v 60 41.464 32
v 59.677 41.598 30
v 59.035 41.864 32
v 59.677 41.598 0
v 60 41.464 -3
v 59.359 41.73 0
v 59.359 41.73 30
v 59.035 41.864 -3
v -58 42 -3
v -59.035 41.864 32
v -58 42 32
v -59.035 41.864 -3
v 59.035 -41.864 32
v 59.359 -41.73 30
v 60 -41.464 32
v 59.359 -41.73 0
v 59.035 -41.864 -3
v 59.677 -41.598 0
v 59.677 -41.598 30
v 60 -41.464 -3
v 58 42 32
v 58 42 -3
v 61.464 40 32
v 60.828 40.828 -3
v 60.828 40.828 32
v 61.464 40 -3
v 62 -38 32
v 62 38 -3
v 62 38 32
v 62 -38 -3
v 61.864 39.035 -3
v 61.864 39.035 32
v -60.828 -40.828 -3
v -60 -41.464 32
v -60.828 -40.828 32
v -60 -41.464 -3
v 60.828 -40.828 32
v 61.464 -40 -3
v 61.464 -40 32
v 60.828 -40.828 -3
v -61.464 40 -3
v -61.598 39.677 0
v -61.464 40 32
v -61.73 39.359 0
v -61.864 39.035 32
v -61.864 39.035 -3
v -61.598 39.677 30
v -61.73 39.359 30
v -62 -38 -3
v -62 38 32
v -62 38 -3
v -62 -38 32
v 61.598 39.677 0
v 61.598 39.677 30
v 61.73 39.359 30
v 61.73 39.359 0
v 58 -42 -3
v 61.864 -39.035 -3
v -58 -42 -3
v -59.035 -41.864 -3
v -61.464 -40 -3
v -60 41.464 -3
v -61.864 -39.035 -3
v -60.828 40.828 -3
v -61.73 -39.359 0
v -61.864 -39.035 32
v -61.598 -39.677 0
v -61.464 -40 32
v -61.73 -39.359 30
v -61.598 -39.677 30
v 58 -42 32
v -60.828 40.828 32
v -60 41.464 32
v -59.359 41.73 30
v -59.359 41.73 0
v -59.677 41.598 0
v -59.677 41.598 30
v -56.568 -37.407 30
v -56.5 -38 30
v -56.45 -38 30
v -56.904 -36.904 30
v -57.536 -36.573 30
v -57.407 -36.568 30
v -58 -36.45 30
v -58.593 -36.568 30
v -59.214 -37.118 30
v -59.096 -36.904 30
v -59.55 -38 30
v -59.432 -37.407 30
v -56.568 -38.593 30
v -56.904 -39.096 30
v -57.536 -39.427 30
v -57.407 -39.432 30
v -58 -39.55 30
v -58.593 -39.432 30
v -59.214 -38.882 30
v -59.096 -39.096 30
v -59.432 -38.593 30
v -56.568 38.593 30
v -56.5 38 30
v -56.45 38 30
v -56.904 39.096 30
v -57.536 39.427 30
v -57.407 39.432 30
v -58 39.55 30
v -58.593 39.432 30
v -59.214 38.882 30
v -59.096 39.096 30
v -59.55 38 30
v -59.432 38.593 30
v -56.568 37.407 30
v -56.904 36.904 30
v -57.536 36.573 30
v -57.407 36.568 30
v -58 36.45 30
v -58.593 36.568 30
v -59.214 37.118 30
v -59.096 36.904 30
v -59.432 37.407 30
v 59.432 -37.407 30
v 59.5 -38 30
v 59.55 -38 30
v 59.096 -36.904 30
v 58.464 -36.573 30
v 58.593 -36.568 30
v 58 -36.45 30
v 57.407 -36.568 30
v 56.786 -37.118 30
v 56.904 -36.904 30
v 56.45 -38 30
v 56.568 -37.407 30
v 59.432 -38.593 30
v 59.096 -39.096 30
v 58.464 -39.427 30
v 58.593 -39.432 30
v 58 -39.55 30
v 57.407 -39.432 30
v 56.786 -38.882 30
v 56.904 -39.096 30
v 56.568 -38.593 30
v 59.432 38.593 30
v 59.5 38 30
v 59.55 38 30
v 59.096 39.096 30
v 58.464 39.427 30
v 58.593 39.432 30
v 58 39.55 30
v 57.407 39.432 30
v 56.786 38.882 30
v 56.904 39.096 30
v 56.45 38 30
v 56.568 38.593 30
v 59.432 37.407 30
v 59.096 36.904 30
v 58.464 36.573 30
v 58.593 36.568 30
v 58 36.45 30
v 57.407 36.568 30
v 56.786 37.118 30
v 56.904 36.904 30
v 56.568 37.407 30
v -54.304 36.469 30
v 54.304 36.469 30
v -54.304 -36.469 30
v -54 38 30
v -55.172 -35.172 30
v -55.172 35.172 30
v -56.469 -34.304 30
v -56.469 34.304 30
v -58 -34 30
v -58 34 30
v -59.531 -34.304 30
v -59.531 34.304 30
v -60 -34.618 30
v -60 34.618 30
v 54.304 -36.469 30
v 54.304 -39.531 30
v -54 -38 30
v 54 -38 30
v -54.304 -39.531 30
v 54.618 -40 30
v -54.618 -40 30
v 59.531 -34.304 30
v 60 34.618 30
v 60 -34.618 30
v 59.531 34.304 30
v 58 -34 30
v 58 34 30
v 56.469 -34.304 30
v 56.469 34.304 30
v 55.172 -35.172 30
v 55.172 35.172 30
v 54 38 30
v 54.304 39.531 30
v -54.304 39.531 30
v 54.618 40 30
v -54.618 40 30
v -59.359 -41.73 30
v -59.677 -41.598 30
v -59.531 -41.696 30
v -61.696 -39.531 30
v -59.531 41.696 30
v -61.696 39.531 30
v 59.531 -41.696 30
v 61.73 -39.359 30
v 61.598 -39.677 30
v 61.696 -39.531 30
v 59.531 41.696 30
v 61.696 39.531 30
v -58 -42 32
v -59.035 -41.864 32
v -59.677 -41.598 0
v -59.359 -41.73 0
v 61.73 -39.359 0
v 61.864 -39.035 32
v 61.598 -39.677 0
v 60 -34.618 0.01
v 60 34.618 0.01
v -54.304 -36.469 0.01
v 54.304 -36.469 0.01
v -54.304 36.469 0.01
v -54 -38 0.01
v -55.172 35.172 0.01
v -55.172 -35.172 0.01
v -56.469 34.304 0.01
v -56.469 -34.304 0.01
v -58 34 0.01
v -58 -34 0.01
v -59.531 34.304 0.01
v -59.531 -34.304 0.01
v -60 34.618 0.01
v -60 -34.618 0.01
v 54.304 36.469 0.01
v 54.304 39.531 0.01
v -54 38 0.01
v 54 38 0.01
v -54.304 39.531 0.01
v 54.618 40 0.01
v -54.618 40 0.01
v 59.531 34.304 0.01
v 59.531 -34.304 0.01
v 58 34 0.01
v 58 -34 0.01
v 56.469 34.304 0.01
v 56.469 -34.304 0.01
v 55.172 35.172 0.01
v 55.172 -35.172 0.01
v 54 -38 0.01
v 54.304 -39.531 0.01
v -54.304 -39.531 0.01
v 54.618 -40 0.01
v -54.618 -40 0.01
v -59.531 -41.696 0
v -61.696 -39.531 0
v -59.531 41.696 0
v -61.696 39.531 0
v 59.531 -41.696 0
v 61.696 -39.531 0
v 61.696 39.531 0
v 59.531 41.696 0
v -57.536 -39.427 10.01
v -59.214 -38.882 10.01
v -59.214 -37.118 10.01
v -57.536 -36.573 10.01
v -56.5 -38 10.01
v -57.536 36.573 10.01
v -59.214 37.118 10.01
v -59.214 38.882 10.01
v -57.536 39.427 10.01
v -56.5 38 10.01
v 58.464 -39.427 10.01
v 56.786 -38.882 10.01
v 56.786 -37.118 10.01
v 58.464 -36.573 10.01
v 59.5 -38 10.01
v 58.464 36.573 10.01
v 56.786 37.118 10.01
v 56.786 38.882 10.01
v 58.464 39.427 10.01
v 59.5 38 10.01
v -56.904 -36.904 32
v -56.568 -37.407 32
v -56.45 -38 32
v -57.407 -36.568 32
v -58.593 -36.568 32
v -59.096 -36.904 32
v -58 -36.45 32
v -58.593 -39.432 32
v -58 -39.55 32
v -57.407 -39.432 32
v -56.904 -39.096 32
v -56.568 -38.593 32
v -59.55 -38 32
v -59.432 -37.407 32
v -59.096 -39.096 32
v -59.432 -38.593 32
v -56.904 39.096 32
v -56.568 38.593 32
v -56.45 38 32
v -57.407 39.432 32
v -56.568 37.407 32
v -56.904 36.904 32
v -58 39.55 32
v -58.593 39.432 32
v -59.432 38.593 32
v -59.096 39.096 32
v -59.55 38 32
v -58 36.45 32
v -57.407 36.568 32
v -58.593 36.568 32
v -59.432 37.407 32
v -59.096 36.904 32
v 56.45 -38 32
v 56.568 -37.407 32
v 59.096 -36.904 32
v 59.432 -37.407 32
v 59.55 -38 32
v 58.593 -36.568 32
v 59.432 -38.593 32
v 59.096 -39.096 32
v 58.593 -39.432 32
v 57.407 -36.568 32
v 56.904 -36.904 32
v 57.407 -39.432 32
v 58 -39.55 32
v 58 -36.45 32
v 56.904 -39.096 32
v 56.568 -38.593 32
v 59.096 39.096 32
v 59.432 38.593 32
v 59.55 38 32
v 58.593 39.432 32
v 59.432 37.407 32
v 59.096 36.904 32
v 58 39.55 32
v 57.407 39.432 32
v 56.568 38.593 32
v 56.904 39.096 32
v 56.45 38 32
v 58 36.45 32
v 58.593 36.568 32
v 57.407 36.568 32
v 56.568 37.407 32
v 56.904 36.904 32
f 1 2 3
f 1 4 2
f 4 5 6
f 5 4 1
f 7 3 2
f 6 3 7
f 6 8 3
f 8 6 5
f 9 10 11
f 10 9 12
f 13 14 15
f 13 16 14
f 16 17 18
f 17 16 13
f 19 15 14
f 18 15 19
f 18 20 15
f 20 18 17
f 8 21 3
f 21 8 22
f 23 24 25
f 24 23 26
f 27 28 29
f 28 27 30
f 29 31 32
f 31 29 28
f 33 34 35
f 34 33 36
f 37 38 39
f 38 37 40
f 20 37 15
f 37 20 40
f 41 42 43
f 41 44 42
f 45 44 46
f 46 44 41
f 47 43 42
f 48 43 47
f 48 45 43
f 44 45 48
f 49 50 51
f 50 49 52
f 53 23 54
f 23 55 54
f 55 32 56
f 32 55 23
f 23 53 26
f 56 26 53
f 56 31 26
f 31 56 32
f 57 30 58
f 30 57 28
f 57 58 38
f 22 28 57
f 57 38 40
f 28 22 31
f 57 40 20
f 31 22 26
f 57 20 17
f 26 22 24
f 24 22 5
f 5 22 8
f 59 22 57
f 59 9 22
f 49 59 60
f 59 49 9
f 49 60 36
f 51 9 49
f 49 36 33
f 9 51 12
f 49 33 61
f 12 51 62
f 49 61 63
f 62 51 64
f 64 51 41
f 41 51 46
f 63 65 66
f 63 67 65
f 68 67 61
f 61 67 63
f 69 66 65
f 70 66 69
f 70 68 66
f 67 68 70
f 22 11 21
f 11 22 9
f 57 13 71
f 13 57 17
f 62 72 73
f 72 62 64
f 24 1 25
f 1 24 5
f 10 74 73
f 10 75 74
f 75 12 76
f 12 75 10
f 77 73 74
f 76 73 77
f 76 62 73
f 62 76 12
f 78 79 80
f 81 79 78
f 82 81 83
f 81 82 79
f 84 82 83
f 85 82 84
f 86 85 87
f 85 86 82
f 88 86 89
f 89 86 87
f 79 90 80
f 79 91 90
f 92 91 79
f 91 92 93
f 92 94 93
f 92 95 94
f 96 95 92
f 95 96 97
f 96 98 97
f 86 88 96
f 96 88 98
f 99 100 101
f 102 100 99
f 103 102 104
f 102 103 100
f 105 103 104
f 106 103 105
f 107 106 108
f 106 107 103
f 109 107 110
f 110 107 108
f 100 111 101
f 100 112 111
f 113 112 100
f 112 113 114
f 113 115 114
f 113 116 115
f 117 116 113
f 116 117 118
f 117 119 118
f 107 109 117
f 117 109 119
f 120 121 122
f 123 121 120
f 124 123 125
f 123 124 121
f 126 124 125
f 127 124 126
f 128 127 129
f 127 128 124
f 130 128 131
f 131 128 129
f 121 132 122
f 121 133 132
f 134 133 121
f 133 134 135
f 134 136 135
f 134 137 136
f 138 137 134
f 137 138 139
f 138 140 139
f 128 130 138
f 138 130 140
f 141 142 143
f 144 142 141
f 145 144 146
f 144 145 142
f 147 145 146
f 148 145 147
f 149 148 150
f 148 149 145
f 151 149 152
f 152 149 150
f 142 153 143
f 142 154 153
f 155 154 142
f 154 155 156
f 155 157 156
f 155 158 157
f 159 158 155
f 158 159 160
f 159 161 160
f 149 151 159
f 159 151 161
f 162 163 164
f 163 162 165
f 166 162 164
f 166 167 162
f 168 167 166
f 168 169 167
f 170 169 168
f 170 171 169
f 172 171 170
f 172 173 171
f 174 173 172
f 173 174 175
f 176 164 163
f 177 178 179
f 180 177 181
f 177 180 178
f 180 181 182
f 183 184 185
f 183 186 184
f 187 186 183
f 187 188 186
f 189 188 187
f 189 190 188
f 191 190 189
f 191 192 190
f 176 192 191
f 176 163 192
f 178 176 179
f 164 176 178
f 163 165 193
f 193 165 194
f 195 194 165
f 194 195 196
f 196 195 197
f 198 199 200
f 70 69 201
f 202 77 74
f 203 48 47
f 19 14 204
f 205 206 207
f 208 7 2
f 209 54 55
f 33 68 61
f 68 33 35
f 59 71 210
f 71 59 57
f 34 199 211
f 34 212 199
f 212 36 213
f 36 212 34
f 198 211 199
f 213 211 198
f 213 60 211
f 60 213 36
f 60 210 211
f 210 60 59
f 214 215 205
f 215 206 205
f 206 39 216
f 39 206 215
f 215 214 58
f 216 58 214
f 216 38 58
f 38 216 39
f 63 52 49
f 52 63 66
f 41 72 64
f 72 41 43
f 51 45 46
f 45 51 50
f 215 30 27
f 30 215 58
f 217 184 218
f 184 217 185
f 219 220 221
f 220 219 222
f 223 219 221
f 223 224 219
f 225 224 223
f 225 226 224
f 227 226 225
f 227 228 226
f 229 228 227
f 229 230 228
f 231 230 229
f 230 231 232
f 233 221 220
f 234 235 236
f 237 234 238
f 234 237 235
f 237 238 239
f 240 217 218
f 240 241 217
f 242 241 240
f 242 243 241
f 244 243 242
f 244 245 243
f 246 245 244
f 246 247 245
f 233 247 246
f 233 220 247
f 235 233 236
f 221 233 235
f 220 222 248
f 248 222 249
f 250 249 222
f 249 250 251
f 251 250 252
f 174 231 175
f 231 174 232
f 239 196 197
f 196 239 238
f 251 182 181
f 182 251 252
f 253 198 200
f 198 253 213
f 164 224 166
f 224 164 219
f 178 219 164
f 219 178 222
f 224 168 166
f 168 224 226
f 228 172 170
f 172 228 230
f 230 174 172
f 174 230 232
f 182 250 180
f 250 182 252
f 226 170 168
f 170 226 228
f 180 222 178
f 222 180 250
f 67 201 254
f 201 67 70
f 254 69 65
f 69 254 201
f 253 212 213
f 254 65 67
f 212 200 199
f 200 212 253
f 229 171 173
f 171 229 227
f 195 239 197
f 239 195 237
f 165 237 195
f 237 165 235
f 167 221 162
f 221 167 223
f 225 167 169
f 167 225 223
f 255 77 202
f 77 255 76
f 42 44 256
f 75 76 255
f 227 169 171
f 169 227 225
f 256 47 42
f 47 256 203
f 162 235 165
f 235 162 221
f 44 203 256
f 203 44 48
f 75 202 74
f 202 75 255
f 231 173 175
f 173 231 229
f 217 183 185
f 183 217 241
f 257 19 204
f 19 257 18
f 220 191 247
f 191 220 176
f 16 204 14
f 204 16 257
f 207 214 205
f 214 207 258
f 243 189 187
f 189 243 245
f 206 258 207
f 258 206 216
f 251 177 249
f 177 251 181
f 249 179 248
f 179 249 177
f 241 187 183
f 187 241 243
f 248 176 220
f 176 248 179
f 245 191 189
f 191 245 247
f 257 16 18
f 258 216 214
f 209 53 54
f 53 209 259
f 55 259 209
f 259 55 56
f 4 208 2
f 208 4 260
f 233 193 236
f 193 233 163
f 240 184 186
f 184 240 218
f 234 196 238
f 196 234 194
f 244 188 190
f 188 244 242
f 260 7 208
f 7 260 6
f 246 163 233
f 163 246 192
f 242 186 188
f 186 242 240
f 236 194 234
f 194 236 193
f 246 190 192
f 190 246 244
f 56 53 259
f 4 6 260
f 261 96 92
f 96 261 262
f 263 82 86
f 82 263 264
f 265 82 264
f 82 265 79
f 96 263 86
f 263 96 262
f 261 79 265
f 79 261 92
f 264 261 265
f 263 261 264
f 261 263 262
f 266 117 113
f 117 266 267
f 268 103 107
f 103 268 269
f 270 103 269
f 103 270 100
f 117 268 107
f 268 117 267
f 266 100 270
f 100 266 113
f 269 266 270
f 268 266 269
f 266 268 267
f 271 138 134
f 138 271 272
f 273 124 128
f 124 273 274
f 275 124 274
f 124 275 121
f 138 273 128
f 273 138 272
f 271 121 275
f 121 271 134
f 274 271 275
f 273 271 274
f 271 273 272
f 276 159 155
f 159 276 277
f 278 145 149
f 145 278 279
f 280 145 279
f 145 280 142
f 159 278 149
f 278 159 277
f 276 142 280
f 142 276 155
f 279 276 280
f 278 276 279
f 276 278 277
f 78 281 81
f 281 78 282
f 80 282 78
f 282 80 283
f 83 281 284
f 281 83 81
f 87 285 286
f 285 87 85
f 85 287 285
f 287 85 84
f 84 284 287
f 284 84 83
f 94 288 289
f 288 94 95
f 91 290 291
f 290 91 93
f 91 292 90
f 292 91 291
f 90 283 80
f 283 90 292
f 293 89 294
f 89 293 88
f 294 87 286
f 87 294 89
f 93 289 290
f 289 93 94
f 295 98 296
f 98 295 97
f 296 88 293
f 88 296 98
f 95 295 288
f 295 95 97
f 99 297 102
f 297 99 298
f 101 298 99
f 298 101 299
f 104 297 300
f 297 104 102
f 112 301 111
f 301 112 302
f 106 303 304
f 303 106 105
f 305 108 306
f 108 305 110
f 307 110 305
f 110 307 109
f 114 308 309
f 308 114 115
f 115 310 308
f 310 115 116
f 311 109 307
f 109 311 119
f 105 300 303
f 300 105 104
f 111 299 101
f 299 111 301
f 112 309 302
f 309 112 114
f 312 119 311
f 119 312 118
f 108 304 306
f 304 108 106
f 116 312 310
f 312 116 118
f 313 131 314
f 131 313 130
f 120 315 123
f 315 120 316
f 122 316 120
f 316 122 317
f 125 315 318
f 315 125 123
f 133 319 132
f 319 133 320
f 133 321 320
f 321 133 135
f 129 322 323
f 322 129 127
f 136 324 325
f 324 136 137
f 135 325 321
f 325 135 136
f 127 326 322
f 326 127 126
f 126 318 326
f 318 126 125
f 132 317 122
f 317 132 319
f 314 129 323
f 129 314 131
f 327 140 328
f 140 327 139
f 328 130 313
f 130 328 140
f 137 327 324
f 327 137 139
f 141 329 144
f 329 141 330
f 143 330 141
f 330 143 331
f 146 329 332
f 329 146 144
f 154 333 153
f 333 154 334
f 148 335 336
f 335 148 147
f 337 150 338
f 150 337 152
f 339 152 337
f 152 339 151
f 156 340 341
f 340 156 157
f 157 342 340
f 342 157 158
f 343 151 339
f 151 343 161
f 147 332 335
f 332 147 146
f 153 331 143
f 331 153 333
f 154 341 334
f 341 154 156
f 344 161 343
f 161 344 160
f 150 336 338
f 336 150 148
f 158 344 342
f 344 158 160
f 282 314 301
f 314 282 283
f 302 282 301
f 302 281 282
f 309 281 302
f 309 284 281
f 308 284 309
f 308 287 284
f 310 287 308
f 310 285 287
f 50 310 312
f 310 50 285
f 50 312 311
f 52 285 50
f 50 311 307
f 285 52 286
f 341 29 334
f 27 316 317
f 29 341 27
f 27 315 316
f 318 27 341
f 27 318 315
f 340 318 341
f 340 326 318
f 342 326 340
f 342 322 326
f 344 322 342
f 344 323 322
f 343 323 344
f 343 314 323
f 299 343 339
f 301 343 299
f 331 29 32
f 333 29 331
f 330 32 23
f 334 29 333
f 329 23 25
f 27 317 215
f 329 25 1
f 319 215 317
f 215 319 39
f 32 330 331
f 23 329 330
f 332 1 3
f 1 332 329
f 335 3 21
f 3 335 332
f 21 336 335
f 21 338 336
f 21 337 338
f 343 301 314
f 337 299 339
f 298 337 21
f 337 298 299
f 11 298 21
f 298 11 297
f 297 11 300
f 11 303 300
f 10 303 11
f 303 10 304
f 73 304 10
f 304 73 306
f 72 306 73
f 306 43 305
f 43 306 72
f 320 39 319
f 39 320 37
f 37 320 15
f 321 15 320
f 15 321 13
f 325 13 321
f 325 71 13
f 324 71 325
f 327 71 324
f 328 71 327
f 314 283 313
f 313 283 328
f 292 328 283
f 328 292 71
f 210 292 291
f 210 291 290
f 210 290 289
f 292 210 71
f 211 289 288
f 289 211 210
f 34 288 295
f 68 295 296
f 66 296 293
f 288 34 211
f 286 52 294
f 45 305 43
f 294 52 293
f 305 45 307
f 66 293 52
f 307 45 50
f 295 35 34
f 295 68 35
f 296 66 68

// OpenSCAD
// That Box
// See https://github.com/DanNixon/SCAD_Lib/tree/main/that-box

module ThatBox_Layout(dims, corner_radius) {
  dx = (dims[0] / 2) - corner_radius;
  dy = (dims[1] / 2) - corner_radius;

  for(x = [-dx, dx]) {
    for(y = [-dy, dy]) {
      translate([x, y]) {
        children();
      }
    }
  }
}

module ThatBox_Plate(dims, thickness, corner_radius) {
  hull() {
    ThatBox_Layout(dims, corner_radius) {
      cylinder(h = thickness, r = corner_radius, $fn = 24);
    }
  }
}

function PlateSize(inner, wall_thickness) = [inner[0] + (wall_thickness * 2), inner[1] + (wall_thickness * 2)];

module ThatBox_Box(
  inner = [120, 80, 30],
  wall_thickness = 2,
  corner_radius = 4,
  mounting_hole_diameter = 3,
  mounting_hole_depth = 20,
  base_thickness = 3,
) {
  plate_size = PlateSize(inner, wall_thickness);

  difference() {
    // Outer volume
    translate([0, 0, -base_thickness]) {
      ThatBox_Plate(dims = plate_size, thickness = inner[2] + base_thickness, corner_radius = corner_radius);
    }

    // Inner volume
    translate([0, 0, (inner[2] / 2) + 0.01]) {
      cube(inner, center = true);
    }
  }

  difference() {
    // Mounting hole supports
    ThatBox_Layout(dims = plate_size, corner_radius = corner_radius) {
      cylinder(h = inner[2], r = corner_radius, $fn = 16);
    }

    // Mounting holes
    ThatBox_Layout(dims = plate_size, corner_radius = corner_radius) {
      translate([0, 0, inner[2] - mounting_hole_depth + 0.01]) {
        cylinder(h = mounting_hole_depth, d = mounting_hole_diameter, $fn = 5);
      }
    }
  }
}

module ThatBox_Lid(
  inner = [120, 80, 30],
  wall_thickness = 2,
  corner_radius = 4,
  mounting_hole_diameter = 3.1,
  lid_thickness = 2,
) {
  plate_size = PlateSize(inner, wall_thickness);

  difference() {
    // Panel
    ThatBox_Plate(dims = plate_size, thickness = lid_thickness, corner_radius = corner_radius);

    // Mounting holes
    ThatBox_Layout(dims = plate_size, corner_radius = corner_radius) {
      translate([0, 0, -1]) {
        cylinder(h = lid_thickness + 2, d = mounting_hole_diameter, $fn = 16);
      }
    }
  }
}

// Demo
color("red") {
  ThatBox_Box();
}
translate([0, 0, 30]) {
  color("blue", 0.5) {
    ThatBox_Lid();
  }
}
